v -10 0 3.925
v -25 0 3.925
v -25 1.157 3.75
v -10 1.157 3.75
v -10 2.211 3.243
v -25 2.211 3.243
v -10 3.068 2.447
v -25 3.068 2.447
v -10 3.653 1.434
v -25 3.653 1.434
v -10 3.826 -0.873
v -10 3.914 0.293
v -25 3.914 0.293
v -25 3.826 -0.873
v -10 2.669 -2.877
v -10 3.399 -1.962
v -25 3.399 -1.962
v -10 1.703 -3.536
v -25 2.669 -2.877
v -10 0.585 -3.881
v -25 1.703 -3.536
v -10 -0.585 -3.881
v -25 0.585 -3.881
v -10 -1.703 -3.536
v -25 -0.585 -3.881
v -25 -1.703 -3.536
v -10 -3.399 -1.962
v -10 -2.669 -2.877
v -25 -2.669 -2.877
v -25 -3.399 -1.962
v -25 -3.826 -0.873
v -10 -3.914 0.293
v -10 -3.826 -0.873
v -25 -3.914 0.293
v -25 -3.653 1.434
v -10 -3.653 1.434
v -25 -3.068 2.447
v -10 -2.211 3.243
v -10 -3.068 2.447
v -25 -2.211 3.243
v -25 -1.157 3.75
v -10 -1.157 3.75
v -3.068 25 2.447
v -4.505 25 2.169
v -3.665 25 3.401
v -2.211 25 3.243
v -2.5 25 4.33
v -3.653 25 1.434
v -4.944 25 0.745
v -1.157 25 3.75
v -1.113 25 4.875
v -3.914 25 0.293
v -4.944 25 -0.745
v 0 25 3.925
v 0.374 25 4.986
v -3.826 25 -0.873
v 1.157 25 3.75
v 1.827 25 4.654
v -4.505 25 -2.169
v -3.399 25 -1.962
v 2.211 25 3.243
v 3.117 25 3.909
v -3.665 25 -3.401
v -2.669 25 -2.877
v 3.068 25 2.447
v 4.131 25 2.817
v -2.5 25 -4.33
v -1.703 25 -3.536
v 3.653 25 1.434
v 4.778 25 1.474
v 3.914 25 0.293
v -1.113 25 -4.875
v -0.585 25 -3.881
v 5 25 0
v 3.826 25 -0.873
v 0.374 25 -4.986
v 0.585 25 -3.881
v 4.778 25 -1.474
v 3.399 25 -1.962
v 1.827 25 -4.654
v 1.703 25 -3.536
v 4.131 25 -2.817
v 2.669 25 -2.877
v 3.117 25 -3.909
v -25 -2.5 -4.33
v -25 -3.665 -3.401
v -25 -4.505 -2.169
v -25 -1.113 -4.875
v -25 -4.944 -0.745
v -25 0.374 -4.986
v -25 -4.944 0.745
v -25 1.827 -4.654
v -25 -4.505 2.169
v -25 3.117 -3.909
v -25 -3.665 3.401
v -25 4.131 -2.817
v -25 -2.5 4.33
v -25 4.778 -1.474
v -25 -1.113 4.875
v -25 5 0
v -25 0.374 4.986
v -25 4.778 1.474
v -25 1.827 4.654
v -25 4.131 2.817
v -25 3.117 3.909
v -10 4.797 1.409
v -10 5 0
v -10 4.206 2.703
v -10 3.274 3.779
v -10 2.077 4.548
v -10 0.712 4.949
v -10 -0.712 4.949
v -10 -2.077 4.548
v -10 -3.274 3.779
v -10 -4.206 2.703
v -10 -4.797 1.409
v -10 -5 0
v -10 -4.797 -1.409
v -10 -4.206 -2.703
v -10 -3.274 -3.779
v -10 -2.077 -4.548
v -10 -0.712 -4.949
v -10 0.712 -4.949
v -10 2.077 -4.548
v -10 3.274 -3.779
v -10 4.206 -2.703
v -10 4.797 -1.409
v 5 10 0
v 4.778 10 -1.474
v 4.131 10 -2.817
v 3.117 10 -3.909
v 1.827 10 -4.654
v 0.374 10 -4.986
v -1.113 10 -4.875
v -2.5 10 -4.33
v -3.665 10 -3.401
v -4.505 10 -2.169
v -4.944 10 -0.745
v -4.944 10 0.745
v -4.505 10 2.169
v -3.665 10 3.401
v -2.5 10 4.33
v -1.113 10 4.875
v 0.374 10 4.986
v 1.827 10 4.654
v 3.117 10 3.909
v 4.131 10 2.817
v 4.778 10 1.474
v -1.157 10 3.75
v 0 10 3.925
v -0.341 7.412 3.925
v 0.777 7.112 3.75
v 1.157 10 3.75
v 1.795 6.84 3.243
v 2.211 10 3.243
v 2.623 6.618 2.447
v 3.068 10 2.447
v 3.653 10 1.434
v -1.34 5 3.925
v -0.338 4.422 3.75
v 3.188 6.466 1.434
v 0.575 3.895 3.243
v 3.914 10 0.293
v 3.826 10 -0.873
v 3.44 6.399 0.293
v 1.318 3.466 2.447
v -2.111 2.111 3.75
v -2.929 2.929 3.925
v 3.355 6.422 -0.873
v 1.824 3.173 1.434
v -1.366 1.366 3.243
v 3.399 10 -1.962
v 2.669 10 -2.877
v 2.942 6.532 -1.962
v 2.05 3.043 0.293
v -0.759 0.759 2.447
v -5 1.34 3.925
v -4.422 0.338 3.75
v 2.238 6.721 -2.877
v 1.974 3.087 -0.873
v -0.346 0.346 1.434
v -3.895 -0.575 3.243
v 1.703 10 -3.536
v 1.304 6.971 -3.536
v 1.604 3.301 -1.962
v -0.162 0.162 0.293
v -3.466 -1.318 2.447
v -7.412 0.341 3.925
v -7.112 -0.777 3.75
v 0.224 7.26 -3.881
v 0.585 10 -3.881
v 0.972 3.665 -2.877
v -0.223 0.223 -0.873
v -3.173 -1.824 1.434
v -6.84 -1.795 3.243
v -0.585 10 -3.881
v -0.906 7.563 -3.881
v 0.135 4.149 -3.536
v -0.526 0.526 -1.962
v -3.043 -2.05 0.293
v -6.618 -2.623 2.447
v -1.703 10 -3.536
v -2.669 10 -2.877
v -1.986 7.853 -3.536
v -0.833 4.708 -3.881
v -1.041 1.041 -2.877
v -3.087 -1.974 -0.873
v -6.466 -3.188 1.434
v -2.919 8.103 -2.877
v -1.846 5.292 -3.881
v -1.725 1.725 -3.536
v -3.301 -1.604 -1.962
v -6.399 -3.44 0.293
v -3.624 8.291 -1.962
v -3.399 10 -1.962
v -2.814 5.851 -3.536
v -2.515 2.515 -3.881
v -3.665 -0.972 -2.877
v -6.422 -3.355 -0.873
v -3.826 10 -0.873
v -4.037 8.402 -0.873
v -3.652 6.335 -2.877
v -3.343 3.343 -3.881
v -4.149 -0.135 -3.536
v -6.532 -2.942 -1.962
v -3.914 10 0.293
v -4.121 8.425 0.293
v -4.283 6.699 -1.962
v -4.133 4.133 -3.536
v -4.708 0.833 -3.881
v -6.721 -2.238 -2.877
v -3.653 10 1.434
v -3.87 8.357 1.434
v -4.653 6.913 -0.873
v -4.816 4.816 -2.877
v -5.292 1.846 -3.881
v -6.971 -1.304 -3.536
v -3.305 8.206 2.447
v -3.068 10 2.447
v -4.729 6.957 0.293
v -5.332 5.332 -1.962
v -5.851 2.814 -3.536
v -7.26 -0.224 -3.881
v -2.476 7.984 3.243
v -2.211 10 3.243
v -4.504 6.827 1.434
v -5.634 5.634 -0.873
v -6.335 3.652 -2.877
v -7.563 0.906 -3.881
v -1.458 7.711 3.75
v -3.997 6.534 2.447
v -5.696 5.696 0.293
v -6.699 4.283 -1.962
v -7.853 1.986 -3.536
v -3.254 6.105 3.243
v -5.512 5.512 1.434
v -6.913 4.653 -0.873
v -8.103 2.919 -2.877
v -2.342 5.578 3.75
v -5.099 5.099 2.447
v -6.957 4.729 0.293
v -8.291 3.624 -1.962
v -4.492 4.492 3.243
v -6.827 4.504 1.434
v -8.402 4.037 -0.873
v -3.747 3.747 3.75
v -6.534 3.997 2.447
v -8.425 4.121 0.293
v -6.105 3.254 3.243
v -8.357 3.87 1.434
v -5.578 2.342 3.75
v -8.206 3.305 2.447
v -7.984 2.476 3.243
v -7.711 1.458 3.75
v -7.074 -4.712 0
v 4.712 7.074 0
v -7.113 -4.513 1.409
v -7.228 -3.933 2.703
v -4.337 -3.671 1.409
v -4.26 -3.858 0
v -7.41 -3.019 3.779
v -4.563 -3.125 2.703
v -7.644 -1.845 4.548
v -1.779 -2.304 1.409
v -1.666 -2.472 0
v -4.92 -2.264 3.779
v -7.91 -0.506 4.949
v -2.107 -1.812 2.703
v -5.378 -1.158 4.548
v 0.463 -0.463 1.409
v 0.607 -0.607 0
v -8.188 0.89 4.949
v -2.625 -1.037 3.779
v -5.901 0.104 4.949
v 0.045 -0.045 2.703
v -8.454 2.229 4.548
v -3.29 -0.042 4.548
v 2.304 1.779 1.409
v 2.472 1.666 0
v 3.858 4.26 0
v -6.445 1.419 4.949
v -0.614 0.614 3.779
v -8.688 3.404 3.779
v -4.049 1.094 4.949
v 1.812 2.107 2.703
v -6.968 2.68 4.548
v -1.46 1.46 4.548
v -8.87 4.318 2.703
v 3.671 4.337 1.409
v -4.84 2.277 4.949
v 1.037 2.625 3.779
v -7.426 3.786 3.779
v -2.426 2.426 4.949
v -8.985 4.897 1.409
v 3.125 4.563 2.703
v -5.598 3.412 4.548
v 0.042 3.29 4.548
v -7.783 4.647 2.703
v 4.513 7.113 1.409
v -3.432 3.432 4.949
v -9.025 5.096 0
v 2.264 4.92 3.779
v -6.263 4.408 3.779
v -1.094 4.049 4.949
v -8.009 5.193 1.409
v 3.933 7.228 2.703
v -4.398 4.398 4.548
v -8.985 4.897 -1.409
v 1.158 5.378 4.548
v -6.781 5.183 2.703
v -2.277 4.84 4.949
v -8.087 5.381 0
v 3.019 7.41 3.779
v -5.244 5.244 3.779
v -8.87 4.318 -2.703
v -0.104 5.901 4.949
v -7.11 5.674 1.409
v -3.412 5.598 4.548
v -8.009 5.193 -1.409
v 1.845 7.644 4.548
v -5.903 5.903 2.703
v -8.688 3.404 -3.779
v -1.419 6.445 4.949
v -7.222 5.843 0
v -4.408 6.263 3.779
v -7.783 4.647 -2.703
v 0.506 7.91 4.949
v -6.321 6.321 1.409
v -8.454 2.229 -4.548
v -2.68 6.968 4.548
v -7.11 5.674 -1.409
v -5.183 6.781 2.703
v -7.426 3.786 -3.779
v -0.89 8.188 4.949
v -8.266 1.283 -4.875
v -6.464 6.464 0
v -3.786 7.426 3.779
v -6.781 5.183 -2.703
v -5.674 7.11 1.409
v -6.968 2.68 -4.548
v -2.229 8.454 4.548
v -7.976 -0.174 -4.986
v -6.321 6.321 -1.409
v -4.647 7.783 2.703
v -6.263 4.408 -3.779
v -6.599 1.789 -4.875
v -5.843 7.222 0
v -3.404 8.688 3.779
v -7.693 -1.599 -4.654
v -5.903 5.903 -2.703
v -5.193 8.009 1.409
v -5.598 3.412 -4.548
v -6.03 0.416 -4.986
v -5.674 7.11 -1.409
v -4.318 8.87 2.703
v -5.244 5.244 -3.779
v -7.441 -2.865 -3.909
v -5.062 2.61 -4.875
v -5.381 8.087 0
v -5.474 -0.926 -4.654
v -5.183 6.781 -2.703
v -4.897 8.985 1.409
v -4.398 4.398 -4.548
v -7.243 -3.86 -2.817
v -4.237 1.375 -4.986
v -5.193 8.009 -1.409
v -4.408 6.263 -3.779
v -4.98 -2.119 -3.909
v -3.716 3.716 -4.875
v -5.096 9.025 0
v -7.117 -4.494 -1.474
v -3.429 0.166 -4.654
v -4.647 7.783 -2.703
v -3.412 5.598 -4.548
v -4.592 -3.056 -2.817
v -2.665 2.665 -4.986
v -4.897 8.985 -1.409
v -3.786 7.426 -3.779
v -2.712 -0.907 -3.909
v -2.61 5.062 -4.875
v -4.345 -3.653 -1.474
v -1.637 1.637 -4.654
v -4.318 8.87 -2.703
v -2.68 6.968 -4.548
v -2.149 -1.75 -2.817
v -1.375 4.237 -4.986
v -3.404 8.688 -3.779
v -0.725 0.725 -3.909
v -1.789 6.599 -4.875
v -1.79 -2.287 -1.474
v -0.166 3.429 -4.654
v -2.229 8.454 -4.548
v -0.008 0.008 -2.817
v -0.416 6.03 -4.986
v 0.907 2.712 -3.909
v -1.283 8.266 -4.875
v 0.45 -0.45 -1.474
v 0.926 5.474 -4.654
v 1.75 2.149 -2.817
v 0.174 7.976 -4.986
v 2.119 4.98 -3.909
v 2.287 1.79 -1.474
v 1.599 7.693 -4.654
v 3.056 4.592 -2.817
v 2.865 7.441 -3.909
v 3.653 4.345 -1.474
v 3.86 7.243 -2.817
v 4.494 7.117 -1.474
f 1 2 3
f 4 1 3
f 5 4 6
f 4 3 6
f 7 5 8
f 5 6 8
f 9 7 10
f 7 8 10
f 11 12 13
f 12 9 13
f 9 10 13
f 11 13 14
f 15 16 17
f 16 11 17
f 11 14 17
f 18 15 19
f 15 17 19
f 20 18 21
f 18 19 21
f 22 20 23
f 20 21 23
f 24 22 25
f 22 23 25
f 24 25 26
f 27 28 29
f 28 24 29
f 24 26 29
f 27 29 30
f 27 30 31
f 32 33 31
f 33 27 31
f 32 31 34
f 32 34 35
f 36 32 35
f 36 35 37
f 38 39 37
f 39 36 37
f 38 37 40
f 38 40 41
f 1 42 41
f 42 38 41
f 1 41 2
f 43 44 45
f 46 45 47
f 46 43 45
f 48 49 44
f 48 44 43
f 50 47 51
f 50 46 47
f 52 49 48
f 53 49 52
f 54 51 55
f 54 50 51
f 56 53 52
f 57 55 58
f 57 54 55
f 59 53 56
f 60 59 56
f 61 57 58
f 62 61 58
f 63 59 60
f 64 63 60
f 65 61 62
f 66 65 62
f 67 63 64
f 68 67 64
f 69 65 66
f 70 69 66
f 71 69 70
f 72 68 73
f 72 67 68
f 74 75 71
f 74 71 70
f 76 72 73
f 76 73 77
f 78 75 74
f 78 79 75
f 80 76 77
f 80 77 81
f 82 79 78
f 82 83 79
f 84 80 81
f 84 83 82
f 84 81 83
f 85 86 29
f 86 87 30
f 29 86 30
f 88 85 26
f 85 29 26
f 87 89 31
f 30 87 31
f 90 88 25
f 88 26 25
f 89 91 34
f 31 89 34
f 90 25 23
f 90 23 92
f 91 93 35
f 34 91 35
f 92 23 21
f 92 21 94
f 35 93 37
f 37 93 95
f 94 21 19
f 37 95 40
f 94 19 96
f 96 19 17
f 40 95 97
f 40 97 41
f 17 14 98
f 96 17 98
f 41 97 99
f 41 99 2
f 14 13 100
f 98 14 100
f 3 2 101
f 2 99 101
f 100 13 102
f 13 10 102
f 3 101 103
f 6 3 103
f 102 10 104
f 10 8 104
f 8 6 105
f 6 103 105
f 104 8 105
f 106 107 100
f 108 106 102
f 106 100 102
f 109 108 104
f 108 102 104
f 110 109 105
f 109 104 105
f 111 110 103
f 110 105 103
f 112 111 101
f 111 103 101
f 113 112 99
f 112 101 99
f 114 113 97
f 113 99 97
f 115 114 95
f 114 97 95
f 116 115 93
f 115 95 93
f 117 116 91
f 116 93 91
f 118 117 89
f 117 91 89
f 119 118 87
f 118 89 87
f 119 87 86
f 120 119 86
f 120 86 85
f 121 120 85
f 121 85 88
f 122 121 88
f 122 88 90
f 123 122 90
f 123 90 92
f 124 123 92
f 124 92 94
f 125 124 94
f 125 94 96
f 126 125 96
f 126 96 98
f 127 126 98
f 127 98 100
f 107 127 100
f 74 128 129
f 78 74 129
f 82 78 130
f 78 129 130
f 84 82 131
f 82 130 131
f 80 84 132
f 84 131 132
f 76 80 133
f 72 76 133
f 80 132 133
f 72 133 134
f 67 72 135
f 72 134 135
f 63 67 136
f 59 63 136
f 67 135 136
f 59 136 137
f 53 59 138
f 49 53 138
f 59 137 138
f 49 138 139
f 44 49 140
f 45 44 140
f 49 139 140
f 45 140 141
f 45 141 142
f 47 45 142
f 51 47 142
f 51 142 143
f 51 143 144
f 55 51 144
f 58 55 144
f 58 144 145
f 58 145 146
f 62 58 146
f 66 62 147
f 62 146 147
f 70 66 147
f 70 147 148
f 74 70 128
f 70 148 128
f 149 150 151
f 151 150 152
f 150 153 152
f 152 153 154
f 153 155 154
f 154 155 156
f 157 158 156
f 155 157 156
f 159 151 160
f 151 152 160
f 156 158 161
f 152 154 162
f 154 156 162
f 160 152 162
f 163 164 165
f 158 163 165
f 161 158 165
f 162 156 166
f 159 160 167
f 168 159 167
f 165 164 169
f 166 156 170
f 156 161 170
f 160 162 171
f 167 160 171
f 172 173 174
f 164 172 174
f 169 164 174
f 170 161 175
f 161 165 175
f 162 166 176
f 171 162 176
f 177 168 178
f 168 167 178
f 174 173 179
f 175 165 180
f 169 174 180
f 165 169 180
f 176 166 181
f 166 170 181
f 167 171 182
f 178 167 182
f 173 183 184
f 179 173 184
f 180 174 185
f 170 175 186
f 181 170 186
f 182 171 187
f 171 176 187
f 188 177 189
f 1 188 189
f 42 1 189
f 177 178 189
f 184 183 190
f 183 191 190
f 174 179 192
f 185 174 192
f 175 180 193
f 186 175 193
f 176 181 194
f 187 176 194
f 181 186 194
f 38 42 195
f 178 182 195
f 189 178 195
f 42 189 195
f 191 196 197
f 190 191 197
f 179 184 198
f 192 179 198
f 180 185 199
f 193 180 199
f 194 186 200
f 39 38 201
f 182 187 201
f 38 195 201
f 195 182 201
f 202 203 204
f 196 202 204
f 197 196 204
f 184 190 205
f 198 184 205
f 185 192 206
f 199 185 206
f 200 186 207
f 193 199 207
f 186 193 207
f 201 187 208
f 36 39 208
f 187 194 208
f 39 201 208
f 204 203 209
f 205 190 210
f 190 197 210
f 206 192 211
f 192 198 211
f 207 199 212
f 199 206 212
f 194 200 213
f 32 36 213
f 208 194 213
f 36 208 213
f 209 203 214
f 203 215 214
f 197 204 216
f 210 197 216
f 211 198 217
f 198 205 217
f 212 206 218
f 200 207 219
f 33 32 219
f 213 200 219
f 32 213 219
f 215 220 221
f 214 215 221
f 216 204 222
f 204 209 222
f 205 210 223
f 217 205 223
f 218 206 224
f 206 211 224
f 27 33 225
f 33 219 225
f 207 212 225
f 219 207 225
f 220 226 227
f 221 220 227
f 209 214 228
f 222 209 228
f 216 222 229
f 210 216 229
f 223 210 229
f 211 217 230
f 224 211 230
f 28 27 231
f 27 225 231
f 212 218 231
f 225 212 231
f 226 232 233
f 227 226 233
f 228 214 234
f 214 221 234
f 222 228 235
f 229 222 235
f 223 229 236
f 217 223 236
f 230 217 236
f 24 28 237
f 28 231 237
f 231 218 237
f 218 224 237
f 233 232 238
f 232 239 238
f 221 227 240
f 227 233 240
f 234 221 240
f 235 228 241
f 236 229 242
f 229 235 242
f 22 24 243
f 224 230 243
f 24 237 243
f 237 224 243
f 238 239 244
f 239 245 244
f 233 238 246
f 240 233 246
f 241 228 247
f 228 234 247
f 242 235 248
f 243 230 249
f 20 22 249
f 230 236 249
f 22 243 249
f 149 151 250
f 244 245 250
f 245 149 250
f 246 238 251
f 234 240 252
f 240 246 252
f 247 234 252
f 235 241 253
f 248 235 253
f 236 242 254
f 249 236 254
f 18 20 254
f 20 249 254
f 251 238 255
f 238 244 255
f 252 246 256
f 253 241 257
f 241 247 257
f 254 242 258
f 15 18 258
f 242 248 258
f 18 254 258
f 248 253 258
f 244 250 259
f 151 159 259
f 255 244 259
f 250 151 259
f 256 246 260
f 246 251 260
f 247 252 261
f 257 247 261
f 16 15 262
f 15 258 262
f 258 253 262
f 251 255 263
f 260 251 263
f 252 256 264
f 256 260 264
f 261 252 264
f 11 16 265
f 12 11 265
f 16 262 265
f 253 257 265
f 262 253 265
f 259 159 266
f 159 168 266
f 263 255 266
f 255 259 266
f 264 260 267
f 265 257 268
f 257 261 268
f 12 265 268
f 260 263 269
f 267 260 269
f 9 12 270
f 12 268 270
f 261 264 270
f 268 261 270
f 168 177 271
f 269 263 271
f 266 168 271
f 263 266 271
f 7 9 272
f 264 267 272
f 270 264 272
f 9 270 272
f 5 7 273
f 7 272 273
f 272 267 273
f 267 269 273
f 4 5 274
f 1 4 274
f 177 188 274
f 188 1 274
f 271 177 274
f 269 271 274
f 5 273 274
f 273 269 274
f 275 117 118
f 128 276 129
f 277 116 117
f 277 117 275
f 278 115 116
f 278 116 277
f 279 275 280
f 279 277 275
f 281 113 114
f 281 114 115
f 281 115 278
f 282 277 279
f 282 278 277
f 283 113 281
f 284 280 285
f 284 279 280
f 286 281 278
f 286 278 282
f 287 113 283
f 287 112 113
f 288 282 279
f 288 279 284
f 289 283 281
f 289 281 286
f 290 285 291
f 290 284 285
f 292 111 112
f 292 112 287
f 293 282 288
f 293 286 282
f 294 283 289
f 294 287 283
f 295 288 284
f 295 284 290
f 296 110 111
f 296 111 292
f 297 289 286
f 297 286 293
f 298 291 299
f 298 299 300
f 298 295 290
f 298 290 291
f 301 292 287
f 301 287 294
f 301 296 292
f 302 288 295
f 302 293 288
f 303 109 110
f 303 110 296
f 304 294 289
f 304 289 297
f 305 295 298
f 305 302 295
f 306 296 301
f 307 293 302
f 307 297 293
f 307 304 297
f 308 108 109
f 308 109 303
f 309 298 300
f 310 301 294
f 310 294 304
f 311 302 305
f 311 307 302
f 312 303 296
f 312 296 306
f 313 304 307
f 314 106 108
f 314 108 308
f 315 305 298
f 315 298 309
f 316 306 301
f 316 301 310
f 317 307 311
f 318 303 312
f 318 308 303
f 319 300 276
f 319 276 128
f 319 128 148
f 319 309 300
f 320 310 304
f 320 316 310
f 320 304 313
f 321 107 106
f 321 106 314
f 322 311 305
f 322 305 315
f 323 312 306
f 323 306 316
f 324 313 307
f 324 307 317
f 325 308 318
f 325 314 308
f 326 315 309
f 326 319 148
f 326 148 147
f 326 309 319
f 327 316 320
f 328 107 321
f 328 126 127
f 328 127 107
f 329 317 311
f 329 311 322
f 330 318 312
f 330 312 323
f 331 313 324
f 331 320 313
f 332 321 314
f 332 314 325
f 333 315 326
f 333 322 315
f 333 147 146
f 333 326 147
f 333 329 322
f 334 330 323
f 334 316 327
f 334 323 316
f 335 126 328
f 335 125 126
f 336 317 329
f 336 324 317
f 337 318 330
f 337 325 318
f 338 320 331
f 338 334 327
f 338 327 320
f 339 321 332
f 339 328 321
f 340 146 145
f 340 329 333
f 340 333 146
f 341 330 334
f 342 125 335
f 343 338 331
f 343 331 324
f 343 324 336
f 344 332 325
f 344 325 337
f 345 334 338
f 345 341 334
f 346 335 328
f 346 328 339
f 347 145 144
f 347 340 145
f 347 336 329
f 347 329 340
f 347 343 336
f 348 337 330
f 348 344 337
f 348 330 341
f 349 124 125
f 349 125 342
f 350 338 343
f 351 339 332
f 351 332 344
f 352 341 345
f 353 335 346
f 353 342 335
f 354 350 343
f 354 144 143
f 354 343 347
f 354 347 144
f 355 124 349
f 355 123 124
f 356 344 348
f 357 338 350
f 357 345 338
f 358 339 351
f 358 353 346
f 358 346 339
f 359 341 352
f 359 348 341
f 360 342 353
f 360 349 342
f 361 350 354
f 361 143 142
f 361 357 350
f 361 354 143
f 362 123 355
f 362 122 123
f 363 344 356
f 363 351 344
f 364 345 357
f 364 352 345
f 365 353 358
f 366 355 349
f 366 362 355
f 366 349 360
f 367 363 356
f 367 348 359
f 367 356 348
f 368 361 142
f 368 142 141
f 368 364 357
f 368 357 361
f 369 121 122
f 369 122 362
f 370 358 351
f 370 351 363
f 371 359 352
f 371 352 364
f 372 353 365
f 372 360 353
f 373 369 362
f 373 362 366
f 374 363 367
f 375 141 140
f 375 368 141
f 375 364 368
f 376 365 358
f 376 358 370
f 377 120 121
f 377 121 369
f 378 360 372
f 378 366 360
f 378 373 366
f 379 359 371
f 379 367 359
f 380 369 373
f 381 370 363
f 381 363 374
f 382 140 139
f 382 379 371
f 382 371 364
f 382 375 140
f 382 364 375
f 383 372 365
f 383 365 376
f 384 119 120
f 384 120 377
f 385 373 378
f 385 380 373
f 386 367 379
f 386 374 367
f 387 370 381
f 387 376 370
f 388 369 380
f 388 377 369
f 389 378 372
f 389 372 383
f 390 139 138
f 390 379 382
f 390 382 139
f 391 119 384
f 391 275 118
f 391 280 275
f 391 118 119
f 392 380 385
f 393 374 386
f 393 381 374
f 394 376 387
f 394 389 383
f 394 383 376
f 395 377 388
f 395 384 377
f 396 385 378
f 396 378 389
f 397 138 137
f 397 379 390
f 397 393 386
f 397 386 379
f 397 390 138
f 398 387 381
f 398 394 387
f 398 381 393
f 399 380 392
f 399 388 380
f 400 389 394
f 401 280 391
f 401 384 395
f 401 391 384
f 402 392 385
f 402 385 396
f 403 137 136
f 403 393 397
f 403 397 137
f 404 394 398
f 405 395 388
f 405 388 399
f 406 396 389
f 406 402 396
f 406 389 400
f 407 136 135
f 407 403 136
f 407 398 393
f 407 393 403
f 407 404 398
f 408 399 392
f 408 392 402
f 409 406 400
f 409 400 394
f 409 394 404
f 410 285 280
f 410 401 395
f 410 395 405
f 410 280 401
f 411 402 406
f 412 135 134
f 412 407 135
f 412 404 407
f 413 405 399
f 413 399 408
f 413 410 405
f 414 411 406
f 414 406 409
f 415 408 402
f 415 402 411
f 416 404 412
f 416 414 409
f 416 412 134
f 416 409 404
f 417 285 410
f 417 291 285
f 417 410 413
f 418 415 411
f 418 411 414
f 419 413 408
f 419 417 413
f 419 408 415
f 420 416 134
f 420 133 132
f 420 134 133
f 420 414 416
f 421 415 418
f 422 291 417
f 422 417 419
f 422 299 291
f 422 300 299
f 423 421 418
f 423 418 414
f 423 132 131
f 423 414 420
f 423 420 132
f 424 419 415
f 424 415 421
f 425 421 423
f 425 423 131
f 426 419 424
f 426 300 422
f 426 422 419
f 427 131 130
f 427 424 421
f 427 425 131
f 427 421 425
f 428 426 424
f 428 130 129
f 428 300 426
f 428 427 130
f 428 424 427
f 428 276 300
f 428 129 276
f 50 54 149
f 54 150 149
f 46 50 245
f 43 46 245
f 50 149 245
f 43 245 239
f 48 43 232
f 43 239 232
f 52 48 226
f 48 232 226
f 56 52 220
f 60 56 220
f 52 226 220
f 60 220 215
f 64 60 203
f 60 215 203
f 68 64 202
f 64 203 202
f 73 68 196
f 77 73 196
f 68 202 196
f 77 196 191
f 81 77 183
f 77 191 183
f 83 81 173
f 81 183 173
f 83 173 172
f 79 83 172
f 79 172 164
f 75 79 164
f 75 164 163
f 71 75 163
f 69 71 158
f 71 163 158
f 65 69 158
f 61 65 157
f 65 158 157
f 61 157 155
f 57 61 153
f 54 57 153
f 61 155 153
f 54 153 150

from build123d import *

# Parameters (mm, degrees)
SWEEP_START         = 9.9999999
SWEEP_1_OUTLINE_R   = 5
SWEEP_1_DEPTH       = 15.0000001
SWEEP_START_2       = -25
SWEEP_1_2_OUTLINE_R = 5
SWEEP_1_2_DEPTH     = 15
SWEEP_1_3_OUTLINE_R = 5
SWEEP_1_3_ANGLE     = 90
SKETCH_2_R          = 3.924596356


with BuildPart() as part:
    # Sweep 1: read off the stored shape, not the designer's step
    # Sweep 1 outline → Sweep 1 (new body)
    with BuildSketch(Plane(origin=(0, 0, 0), x_dir=(1, 0, 0), z_dir=(0, 1, 0)).offset(SWEEP_START)):
        Circle(SWEEP_1_OUTLINE_R)
    extrude(amount=SWEEP_1_DEPTH)



with BuildPart() as body_2:
    # Sweep 1 2 outline → Sweep 1 2 (new body)
    with BuildSketch(Plane.YZ.offset(SWEEP_START_2)):
        Circle(SWEEP_1_2_OUTLINE_R)
    extrude(amount=SWEEP_1_2_DEPTH)


with BuildPart() as part_1:
    add(part.part)

    add(body_2.part)  # Sweep 1 3 merges body 2
    # Sweep 1 3 outline → Sweep 1 3 (revolve)
    with BuildSketch(Plane(origin=(-10, 10, 0), x_dir=(0, -1, 0), z_dir=(-1, 0, 0))):
        with Locations((10, 0)):
            Circle(SWEEP_1_3_OUTLINE_R)
    revolve(axis=Axis((-10, 10, 0), (0, 0, 1)), revolution_arc=SWEEP_1_3_ANGLE)

    # Sweep 1 4: sweep along a path in 草图4
    with BuildLine(Plane.XY) as sweep_1_4_path:
        Line((0, 25.105232373), (0, 10))
        ThreePointArc((0, 10), (-2.928932188, 2.928932188), (-10, 0))
        Line((-10, 0), (-25, 0))
    # 草图2 → Sweep 1 4 (sweep, cut)
    with BuildSketch(Plane.ZY.offset(25)):
        Circle(SKETCH_2_R)
    sweep(path=sweep_1_4_path.line, mode=Mode.SUBTRACT)


solid = part_1.part
